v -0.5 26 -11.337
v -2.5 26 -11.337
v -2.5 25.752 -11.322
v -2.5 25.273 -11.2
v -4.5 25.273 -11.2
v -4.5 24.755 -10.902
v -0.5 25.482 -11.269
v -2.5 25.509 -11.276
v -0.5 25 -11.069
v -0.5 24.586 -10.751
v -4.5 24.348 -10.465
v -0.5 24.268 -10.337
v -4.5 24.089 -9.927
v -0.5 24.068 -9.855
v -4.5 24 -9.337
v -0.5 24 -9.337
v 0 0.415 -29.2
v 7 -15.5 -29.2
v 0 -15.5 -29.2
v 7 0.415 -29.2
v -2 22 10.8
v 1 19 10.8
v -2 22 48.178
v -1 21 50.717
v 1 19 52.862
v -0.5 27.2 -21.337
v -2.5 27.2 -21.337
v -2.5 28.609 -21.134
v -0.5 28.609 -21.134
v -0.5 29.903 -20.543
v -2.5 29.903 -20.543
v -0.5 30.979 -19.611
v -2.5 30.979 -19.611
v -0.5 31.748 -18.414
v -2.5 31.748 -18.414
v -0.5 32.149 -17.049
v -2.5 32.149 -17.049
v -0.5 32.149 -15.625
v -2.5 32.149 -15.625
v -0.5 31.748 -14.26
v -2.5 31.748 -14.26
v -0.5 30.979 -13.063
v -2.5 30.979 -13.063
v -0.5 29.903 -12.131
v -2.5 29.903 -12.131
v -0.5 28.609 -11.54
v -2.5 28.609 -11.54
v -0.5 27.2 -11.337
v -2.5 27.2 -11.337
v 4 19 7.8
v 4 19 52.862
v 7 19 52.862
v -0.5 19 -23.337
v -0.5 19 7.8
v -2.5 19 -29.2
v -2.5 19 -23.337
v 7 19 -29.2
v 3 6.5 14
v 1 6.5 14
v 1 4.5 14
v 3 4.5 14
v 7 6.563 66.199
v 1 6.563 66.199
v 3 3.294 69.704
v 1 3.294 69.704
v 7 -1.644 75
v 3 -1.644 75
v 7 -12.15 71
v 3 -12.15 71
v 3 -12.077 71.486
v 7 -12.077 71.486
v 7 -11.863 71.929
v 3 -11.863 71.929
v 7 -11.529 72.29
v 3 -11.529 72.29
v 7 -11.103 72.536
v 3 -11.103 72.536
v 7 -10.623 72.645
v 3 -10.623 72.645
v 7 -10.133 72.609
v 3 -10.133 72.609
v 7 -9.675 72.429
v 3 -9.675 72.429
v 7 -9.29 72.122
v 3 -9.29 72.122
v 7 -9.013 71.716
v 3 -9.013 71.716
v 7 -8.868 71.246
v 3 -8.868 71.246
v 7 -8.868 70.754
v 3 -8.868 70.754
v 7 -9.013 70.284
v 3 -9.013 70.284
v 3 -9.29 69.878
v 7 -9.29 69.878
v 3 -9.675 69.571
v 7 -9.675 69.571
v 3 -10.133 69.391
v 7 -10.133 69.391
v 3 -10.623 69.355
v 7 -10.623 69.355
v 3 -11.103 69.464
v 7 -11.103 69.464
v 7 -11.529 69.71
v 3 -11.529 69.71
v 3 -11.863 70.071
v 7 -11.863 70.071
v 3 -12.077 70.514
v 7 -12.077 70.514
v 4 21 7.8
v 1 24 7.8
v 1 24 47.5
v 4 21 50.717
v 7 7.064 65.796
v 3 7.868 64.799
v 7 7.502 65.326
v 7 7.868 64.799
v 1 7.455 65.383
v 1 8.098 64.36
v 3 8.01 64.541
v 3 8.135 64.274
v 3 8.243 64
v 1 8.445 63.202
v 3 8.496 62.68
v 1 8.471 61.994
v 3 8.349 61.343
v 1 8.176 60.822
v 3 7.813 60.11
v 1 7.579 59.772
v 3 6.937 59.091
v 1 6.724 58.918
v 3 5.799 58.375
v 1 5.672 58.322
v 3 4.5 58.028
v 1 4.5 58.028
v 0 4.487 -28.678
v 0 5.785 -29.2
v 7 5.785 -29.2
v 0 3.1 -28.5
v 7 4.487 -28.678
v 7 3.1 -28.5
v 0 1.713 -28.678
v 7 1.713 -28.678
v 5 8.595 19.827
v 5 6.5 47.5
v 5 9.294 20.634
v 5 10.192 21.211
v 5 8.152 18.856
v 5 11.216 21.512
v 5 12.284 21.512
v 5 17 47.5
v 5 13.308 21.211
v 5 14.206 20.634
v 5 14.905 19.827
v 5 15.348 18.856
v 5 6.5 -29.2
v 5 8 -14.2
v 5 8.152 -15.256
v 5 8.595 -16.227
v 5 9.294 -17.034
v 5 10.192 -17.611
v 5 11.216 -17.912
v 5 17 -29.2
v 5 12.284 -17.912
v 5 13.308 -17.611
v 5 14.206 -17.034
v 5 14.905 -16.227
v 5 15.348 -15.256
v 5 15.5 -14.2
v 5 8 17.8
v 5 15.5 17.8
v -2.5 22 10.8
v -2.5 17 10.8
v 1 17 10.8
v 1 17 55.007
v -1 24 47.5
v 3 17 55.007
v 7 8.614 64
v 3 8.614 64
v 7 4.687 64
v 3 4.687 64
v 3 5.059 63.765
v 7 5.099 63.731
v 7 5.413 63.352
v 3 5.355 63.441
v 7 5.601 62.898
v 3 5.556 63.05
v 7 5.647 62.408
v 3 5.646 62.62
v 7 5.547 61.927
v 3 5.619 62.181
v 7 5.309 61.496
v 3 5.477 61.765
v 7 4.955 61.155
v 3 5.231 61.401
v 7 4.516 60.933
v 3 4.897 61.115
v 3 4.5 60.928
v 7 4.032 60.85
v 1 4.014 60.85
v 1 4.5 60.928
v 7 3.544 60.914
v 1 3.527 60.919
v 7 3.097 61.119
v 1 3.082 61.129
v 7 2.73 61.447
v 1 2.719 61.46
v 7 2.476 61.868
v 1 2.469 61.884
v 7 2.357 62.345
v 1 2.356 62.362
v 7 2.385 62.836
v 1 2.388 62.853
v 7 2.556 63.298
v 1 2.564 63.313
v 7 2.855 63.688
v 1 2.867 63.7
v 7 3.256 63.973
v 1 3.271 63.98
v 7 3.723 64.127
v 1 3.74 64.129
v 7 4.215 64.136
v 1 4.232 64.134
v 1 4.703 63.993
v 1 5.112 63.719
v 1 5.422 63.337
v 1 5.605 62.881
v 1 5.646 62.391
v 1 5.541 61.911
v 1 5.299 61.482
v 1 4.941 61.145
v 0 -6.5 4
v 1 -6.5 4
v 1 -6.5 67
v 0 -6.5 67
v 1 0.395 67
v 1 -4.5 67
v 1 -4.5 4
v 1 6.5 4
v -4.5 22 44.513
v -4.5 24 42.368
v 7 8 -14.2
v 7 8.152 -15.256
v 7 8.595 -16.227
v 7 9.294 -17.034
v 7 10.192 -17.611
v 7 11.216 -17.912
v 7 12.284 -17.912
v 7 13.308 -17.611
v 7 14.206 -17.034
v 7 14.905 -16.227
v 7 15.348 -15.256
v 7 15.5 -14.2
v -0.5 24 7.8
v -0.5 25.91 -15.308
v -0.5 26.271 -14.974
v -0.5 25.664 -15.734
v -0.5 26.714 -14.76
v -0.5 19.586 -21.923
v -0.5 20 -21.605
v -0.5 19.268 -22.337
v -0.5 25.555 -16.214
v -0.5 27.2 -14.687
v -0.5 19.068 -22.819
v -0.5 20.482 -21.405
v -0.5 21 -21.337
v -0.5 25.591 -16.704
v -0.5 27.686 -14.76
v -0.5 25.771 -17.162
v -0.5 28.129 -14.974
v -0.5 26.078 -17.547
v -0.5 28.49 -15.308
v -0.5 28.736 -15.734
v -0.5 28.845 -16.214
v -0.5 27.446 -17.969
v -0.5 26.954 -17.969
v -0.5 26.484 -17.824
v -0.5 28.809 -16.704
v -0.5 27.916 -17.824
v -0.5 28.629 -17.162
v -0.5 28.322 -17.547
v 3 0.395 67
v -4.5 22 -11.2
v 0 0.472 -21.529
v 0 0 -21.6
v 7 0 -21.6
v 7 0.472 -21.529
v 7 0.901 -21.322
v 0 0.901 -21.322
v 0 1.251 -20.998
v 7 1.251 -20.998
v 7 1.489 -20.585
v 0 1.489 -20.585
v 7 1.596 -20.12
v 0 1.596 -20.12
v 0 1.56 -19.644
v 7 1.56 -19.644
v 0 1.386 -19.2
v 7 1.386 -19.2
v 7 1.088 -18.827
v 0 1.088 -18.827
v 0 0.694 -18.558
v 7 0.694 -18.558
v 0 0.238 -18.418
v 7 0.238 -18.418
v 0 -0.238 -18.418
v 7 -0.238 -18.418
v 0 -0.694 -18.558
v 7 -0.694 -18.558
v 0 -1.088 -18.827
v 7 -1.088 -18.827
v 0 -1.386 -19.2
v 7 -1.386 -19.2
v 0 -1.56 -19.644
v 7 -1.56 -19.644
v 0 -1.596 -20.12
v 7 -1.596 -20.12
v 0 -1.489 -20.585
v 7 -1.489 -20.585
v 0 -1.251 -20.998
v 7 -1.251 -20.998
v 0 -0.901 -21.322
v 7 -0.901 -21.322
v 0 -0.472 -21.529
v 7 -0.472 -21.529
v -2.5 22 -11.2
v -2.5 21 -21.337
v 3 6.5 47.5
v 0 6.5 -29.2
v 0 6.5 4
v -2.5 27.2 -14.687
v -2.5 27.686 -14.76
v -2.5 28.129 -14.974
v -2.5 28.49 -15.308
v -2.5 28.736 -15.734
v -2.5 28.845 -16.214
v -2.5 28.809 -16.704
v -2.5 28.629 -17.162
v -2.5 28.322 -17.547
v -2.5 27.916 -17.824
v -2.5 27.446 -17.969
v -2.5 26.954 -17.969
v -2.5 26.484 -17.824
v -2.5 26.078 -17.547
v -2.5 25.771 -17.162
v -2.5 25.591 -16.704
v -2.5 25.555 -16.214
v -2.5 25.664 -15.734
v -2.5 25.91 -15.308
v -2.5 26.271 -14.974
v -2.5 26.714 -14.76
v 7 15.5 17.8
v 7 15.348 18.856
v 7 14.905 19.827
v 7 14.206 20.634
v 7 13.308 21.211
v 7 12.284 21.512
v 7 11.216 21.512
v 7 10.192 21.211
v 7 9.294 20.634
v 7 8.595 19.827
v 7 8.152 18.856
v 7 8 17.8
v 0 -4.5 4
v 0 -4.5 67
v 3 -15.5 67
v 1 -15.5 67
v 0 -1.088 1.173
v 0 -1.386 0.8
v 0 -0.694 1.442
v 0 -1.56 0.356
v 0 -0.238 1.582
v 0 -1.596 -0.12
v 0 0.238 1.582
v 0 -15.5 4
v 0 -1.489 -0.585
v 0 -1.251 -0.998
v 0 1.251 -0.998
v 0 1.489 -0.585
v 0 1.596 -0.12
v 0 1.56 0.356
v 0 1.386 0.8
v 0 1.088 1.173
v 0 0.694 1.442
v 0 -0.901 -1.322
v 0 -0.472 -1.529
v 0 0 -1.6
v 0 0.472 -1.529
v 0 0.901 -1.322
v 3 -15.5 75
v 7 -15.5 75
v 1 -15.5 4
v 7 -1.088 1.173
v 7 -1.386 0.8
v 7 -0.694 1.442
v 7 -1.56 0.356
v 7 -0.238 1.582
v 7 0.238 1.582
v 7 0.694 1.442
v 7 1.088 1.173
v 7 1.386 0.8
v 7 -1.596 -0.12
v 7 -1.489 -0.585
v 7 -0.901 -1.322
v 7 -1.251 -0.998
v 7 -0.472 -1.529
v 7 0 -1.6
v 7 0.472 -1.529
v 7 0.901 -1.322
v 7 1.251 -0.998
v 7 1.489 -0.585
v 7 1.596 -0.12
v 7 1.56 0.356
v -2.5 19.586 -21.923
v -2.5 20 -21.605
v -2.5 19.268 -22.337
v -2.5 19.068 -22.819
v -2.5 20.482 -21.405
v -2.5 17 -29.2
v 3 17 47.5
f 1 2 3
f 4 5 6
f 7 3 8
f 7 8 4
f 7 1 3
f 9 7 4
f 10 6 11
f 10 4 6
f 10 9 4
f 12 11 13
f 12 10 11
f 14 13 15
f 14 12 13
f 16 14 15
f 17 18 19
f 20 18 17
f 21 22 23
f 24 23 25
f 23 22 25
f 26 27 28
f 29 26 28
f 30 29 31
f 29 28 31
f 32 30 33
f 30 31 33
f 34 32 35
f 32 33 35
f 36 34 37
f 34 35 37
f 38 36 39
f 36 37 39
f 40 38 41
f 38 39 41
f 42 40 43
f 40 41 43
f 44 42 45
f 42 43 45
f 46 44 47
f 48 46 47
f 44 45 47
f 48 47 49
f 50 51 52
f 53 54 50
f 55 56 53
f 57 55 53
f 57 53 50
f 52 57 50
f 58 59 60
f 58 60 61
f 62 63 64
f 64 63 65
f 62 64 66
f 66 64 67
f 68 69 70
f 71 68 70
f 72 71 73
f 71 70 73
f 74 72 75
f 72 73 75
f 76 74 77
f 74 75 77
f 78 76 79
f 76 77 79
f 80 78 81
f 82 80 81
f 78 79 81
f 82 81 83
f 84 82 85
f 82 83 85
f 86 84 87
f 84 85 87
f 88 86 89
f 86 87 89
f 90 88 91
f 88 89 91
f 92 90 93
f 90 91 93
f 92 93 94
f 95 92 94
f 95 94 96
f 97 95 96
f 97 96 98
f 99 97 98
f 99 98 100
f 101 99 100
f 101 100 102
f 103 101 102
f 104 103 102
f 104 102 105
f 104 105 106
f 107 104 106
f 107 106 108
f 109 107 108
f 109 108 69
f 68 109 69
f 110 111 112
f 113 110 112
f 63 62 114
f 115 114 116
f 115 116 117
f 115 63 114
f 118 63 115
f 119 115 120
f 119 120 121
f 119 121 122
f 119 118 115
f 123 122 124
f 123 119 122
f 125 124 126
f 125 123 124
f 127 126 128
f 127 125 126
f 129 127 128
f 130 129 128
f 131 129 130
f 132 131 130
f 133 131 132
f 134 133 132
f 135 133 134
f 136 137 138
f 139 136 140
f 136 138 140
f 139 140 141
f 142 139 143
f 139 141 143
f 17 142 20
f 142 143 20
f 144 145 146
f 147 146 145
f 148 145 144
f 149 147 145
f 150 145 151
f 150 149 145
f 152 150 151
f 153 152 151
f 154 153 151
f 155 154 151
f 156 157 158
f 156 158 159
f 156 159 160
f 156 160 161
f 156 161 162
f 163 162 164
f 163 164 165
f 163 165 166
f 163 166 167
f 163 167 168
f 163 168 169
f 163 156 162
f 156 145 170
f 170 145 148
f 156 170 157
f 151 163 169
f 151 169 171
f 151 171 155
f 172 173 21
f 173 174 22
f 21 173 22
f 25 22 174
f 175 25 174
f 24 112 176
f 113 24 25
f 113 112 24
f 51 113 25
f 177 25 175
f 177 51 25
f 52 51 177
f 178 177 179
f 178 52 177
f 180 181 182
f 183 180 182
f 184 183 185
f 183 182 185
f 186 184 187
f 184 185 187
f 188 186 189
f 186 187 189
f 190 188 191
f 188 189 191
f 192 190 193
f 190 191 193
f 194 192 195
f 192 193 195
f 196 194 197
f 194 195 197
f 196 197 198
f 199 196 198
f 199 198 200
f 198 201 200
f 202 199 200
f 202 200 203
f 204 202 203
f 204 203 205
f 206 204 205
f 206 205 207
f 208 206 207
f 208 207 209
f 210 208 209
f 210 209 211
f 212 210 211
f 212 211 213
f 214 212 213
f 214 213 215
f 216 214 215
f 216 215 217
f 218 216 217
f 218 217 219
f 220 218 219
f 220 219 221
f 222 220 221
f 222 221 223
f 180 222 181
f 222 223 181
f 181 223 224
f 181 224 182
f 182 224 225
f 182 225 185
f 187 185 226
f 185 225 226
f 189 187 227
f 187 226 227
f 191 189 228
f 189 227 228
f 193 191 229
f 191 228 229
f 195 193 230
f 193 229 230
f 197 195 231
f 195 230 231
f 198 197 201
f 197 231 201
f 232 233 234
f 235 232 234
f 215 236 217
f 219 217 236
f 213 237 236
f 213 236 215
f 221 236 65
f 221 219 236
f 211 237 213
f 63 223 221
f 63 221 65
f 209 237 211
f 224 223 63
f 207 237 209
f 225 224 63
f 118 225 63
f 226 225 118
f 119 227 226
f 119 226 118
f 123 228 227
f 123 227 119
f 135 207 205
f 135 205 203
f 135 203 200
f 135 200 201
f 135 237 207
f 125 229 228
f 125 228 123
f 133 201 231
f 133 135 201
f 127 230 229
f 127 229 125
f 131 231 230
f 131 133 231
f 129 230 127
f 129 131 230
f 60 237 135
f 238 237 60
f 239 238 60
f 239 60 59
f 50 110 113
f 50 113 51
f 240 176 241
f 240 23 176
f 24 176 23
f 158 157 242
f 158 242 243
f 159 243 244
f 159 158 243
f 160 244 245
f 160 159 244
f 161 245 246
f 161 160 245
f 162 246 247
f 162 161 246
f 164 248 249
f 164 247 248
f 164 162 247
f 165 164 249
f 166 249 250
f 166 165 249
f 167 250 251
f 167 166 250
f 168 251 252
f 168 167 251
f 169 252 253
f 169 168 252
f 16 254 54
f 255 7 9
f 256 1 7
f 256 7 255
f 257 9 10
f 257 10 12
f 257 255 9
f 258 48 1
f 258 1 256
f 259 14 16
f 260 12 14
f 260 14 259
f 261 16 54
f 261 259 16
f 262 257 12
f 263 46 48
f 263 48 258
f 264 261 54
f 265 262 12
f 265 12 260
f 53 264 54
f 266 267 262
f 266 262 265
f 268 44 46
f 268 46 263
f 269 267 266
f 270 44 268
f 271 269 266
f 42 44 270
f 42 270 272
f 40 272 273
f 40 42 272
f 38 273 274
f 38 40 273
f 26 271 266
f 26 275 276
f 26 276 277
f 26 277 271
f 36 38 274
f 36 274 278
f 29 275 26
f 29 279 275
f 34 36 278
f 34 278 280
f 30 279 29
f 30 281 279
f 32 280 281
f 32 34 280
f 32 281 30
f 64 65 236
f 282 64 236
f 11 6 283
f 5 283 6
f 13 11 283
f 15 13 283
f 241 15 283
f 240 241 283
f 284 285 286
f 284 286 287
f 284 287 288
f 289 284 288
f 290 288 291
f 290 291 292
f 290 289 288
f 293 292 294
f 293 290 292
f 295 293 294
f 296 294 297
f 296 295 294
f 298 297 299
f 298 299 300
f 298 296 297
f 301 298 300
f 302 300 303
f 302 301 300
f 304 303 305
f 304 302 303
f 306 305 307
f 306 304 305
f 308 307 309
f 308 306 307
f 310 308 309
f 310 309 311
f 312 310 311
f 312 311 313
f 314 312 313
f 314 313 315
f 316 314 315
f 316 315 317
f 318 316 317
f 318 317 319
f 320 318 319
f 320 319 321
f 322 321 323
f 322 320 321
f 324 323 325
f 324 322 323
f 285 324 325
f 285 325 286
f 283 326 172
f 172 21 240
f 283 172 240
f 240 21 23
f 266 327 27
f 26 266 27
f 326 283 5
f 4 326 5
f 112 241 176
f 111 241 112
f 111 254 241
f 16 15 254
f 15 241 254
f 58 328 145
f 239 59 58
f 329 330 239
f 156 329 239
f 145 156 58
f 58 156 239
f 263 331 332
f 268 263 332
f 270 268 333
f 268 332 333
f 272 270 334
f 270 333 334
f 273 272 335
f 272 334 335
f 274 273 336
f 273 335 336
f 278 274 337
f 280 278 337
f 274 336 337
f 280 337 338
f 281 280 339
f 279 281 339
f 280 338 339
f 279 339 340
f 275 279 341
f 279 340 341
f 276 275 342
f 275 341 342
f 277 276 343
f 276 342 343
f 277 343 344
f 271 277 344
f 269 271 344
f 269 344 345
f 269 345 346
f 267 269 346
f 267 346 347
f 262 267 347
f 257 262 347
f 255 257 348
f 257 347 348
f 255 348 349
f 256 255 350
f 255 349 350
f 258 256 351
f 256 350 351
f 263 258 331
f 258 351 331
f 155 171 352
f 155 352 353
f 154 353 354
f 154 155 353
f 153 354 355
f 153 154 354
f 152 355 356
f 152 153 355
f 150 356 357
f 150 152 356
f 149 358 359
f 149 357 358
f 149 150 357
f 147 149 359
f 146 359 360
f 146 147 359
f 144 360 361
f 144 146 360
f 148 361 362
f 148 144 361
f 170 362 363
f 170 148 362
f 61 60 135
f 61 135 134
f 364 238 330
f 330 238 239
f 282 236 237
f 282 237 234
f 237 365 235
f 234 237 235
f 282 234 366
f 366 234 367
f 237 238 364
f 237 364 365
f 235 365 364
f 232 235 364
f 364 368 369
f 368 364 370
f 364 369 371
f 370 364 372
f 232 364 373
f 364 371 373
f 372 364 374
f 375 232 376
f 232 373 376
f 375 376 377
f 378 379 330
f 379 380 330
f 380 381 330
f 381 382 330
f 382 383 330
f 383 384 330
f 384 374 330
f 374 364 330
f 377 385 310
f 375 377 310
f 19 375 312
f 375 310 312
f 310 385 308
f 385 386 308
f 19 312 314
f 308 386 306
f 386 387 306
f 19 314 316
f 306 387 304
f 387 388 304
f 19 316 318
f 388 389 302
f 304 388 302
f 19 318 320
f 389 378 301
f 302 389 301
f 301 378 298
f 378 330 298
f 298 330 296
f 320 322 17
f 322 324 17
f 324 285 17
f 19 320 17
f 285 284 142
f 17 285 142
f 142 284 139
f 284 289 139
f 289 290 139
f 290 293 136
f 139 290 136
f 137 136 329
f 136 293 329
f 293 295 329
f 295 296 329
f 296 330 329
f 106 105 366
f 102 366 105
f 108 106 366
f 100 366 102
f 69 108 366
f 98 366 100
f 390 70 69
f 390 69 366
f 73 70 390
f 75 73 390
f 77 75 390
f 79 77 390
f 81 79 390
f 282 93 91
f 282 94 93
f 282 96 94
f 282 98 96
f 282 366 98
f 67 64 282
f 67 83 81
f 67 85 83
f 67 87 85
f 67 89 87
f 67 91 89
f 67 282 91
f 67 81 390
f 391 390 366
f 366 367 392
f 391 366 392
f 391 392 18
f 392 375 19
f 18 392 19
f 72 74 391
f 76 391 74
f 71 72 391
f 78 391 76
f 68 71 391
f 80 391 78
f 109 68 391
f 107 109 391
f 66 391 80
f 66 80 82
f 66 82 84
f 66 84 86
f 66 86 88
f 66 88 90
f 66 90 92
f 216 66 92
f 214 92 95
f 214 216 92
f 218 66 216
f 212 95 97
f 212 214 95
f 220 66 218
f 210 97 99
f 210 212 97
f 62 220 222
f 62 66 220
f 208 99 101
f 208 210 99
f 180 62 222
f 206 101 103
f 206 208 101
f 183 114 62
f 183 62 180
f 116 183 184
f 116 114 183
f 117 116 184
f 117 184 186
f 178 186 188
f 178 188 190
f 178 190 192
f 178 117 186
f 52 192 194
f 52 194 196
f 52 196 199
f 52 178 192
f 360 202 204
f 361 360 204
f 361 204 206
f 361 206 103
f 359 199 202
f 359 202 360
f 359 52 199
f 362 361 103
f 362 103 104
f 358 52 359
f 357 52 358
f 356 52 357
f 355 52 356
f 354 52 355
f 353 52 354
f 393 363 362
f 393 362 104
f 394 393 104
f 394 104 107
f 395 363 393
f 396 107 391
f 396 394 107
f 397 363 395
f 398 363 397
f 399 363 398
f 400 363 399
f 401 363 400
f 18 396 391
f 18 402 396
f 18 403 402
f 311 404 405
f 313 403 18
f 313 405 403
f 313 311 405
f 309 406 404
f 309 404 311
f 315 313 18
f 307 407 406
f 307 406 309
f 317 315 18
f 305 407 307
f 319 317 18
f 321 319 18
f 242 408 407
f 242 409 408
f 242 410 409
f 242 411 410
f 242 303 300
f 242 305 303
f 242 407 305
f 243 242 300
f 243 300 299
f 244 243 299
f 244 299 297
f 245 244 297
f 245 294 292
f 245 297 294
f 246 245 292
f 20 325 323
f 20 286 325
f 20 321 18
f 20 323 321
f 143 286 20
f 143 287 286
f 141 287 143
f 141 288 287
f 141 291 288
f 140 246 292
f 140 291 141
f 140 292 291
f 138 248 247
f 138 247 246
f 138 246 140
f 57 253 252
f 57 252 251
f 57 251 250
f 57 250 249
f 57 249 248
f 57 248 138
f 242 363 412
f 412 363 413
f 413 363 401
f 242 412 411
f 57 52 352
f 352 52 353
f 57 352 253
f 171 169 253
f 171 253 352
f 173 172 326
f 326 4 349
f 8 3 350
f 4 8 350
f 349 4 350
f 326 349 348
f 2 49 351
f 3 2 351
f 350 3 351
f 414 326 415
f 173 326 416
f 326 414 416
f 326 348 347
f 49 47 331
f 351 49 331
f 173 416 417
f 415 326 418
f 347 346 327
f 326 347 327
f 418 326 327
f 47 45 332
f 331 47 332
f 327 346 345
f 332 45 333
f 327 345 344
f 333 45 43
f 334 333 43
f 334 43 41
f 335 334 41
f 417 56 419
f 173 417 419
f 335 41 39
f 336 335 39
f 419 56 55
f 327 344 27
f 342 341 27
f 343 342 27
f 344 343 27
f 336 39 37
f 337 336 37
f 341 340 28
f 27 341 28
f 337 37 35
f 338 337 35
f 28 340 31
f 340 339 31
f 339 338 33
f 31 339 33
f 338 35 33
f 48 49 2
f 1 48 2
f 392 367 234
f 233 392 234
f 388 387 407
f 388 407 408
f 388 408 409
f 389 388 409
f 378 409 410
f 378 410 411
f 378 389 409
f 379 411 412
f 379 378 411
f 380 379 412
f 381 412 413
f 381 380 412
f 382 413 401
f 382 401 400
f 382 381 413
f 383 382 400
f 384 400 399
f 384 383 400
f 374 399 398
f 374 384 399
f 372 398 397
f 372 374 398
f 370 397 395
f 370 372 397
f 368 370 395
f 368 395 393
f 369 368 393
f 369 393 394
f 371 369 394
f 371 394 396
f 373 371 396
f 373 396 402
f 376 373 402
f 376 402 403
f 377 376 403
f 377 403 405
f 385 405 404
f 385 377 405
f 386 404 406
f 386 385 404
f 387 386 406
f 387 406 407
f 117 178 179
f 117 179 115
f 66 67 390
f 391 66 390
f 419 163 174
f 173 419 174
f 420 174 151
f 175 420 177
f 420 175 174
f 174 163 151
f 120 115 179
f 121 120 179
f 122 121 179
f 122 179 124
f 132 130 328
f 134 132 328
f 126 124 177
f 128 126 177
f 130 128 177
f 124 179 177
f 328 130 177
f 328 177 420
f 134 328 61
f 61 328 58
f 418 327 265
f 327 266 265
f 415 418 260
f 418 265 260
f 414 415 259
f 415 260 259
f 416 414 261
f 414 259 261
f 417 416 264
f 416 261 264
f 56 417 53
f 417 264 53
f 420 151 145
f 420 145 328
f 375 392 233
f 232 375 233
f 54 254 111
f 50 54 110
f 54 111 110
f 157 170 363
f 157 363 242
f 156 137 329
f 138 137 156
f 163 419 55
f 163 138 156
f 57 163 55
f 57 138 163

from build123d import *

# Parameters (mm, degrees)
SKETCH_1_W           = 33.2
SKETCH_1_H           = 22
SKETCH_1_R           = 1.6
EXTRUDE_1_DEPTH      = 7
SKETCH_2_W           = 33.2
SKETCH_2_H           = 10.5
EXTRUDE_2_DEPTH      = 2
EXTRUDE_3_DEPTH      = 60
SKETCH_4_W           = 2
SKETCH_4_H           = 10.5
EXTRUDE_4_DEPTH      = 38.5
SKETCH_5_W           = 4
SKETCH_5_H           = 10.5
EXTRUDE_5_DEPTH      = 2
SKETCH_6_W           = 4
SKETCH_6_H           = 10.5
EXTRUDE_6_DEPTH      = 19.5
SKETCH_7_W           = 6
SKETCH_7_H           = 93.2
EXTRUDE_7_DEPTH      = 2
SKETCH_8_W           = 93.2
SKETCH_8_H           = 5
EXTRUDE_8_DEPTH      = 3
SKETCH_10_W          = 93.2
SKETCH_10_H          = 2
EXTRUDE_9_DEPTH      = 5.5
SKETCH_12_W          = 18
SKETCH_12_H          = 2
CUT_EXTRUDE_1_DEPTH  = 5.5
SKETCH_13_W          = 40
SKETCH_13_H          = 5
EXTRUDE_10_DEPTH     = 3.5
CUT_EXTRUDE_2_REACH  = 70.879
SKETCH_15_W          = 15.5
SKETCH_15_H          = 5
SKETCH_16_W          = 3.5
SKETCH_16_H          = 2.5
EXTRUDE_12_DEPTH     = 2
CUT_EXTRUDE_3_REACH  = 71.313
CHAMFER_1_SIZE       = 3.5
SKETCH_18_R          = 1.65
EXTRUDE_13_DEPTH     = 2
FILLET_1_R           = 2
SKETCH_19_W          = 4.5
SKETCH_19_H          = 21.5
CUT_EXTRUDE_4_DEPTH  = 5
CHAMFER_2_SIZE       = 3
CUT_EXTRUDE_5_REACH  = 74.561
SKETCH_20_R          = 1.65
EXTRUDE_14_REACH     = 73.895
SKETCH_21_R          = 4.5
SKETCH_21_R_2        = 1.65
EXTRUDE_15_DEPTH     = 6
EXTRUDE_16_DEPTH     = 4
CUT_EXTRUDE_6_REACH  = 83.84
SKETCH_24_R          = 1.65
CUT_EXTRUDE_7_REACH  = 84.171
SKETCH_26_W          = 2
SKETCH_26_H          = 10.5
CUT_EXTRUDE_8_DEPTH  = 5
SKETCH_27_W          = 2
SKETCH_27_H          = 2
EXTRUDE_17_DEPTH     = 10
CUT_EXTRUDE_9_DEPTH  = 2
CUT_EXTRUDE_10_REACH = 84.426
SKETCH_29_R          = 5.5
SKETCH_30_W          = 63
SKETCH_30_H          = 2
EXTRUDE_18_DEPTH     = 1


with BuildPart() as part:
    # 草图1 → 凸台-拉伸1 (new body)
    with BuildSketch(Plane(origin=(0, 0, 0), x_dir=(0, 0, -1), z_dir=(1, 0, 0))):
        with Locations((12.6, -4.5)):
            Rectangle(SKETCH_1_W, SKETCH_1_H)
        Circle(SKETCH_1_R, mode=Mode.SUBTRACT)
        with Locations((20, 0)):
            Circle(SKETCH_1_R, mode=Mode.SUBTRACT)
    extrude(amount=EXTRUDE_1_DEPTH)

    # 草图2 → 凸台-拉伸2 (add)
    with BuildSketch(Plane(origin=(7, 0, 0), x_dir=(0, 0, -1), z_dir=(1, 0, 0))):
        with Locations((12.6, 11.75)):
            Rectangle(SKETCH_2_W, SKETCH_2_H)
    extrude(amount=-EXTRUDE_2_DEPTH)

    # 草图3 → 凸台-拉伸3 (add)
    with BuildSketch(Plane.XY.offset(4)):
        Polygon((7, -15.5), (1, -15.5), (1, 4.5), (3, 4.5), (3, 6.5), (7, 6.5), align=None)
    extrude(amount=EXTRUDE_3_DEPTH)

    # 草图4 → 凸台-拉伸4 (add)
    with BuildSketch(Plane.XY.offset(4)):
        with Locations((6, 11.75)):
            Rectangle(SKETCH_4_W, SKETCH_4_H)
    extrude(amount=EXTRUDE_4_DEPTH)

    # 草图5 → 凸台-拉伸5 (add)
    with BuildSketch(Plane.XY.offset(42.5)):
        with Locations((5, 11.75)):
            Rectangle(SKETCH_5_W, SKETCH_5_H)
    extrude(amount=EXTRUDE_5_DEPTH)

    # 草图6 → 凸台-拉伸6 (add)
    with BuildSketch(Plane.XY.offset(44.5)):
        with Locations((5, 11.75)):
            Rectangle(SKETCH_6_W, SKETCH_6_H)
    extrude(amount=EXTRUDE_6_DEPTH)

    # 草图7 → 凸台-拉伸7 (add)
    with BuildSketch(Plane(origin=(0, 17, 0), x_dir=(1, 0, 0), z_dir=(0, 1, 0))):
        with Locations((4, -17.4)):
            Rectangle(SKETCH_7_W, SKETCH_7_H)
    extrude(amount=EXTRUDE_7_DEPTH)

    # 草图8 → 凸台-拉伸8 (add)
    with BuildSketch(Plane.ZY.offset(-1)):
        with Locations((17.4, 21.5)):
            Rectangle(SKETCH_8_W, SKETCH_8_H)
    extrude(amount=-EXTRUDE_8_DEPTH)

    # 草图10 → 凸台-拉伸9 (add)
    with BuildSketch(Plane.ZY.offset(-1)):
        with Locations((17.4, 23)):
            Rectangle(SKETCH_10_W, SKETCH_10_H)
    extrude(amount=EXTRUDE_9_DEPTH)

    # 草图12 → 切除-拉伸1 (cut)
    with BuildSketch(Plane.ZY.offset(4.5)):
        with Locations((-20.2, 23)):
            Rectangle(SKETCH_12_W, SKETCH_12_H)
    extrude(amount=-CUT_EXTRUDE_1_DEPTH, mode=Mode.SUBTRACT)

    # 草图13 → 凸台-拉伸10 (add)
    with BuildSketch(Plane.ZY.offset(-1)):
        with Locations((-9.2, 19.5)):
            Rectangle(SKETCH_13_W, SKETCH_13_H)
    extrude(amount=EXTRUDE_10_DEPTH)

    # 草图15 → 切除-拉伸2 (cut, up to next)
    with BuildSketch(Plane(origin=(4, 0, 0), x_dir=(0, 0, -1), z_dir=(1, 0, 0)), mode=Mode.PRIVATE) as cut_extrude_2_sk1:
        with Locations((21.45, 21.5)):
            Rectangle(SKETCH_15_W, SKETCH_15_H)
    cut_extrude_2_tool1 = extrude(cut_extrude_2_sk1.sketch, amount=-CUT_EXTRUDE_2_REACH, mode=Mode.PRIVATE) & part.part
    add(cut_extrude_2_tool1.solids().sort_by_distance((4, 21.5, -21.45))[0], mode=Mode.SUBTRACT)

    # 草图16 → 凸台-拉伸12 (add)
    with BuildSketch(Plane(origin=(0, 22, 0), x_dir=(1, 0, 0), z_dir=(0, 1, 0))):
        with Locations((-0.75, 12.45)):
            Rectangle(SKETCH_16_W, SKETCH_16_H)
    extrude(amount=EXTRUDE_12_DEPTH)

    # 草图17 → 切除-拉伸3 (cut, up to next)
    with BuildSketch(Plane(origin=(7, 0, 0), x_dir=(0, 0, -1), z_dir=(1, 0, 0)), mode=Mode.PRIVATE) as cut_extrude_3_sk1:
        Polygon((-47.5, 24), (-64, 8.613501079), (-64, 24), align=None)
    cut_extrude_3_tool1 = extrude(cut_extrude_3_sk1.sketch, amount=-CUT_EXTRUDE_3_REACH, mode=Mode.PRIVATE) & part.part
    add(cut_extrude_3_tool1.solids().sort_by_distance((7, 18.871167, 58.5))[0], mode=Mode.SUBTRACT)

    # 倒角1
    # the kernel refuses this chamfer: 3.5 mm, written as the material it takes off along each edge
    with BuildSketch(Plane(origin=(-4.5, 15.861407469, 56.227571974), x_dir=(0.9996219169112969, 0.020109211138415985, 0.018752142756900524), z_dir=(0, 0.6819983600625026, -0.7313537016191667))) as chamfer_1_piece_1:
        Polygon((CHAMFER_1_SIZE * 0.999621916911, CHAMFER_1_SIZE * 0.0274958766106), (-CHAMFER_1_SIZE * 0.0274958766106, CHAMFER_1_SIZE * 0.999621916911), (0, 0), align=None)
    extrude(amount=20.934339287, mode=Mode.SUBTRACT)

    # 草图18 → 凸台-拉伸13 (add)
    with BuildSketch(Plane.ZY.offset(2.5)):
        with BuildLine():
            Line((-11.337, 27.2), (-11.337, 24))
            Line((-11.337, 24), (-13.7, 24))
            Line((-13.7, 24), (-13.7, 19))
            Line((-13.7, 19), (-21.337, 19))
            Line((-21.337, 19), (-21.337, 27.2))
            ThreePointArc((-21.337, 27.2), (-16.337, 32.2), (-11.337, 27.2))
        make_face()
        with Locations((-16.337, 27.2)):
            Circle(SKETCH_18_R, mode=Mode.SUBTRACT)
    extrude(amount=-EXTRUDE_13_DEPTH)

    # 圆角1
    fillet_1_edges = [part.edges().sort_by_distance(p)[0] for p in [
        (-1.5, 24, -11.337),
        (-1.5, 19, -21.337),
    ]]
    fillet(fillet_1_edges, radius=FILLET_1_R)

    # 草图19 → 切除-拉伸4 (cut)
    with BuildSketch(Plane(origin=(0, 24, 0), x_dir=(1, 0, 0), z_dir=(0, 1, 0))):
        with Locations((1.75, 2.95)):
            Rectangle(SKETCH_19_W, SKETCH_19_H)
    extrude(amount=-CUT_EXTRUDE_4_DEPTH, mode=Mode.SUBTRACT)

    # 倒角2
    chamfer_2_edges = [part.edges().sort_by_distance(p)[0] for p in [
        (4, 24, 27.65),
        (1, 22, 30.22236871),
    ]]
    chamfer(chamfer_2_edges, length=CHAMFER_2_SIZE)

    # 草图20 → 切除-拉伸5 (cut, up to next)
    with BuildSketch(Plane(origin=(7, 0, 0), x_dir=(0, 0, -1), z_dir=(1, 0, 0)), mode=Mode.PRIVATE) as cut_extrude_5_sk1:
        with Locations((-62.5, 4)):
            Circle(SKETCH_20_R)
    cut_extrude_5_tool1 = extrude(cut_extrude_5_sk1.sketch, amount=-CUT_EXTRUDE_5_REACH, mode=Mode.PRIVATE) & part.part
    add(cut_extrude_5_tool1.solids().sort_by_distance((7, 4, 62.5))[0], mode=Mode.SUBTRACT)

    # 凸台-拉伸14: up to this face of the body (flat: up to its plane)
    extrude_14_end = Plane(part.part.faces().sort_by_distance((7, 1.498387626, 16.627822956))[0])
    # 草图21 → 凸台-拉伸14 (add, up to the picked face)
    with BuildSketch(Plane.ZY.offset(-1), mode=Mode.PRIVATE) as extrude_14_sk1:
        with Locations((62.5, 4)):
            Circle(SKETCH_21_R)
        with Locations(Location((62.5, 4, 0), (0, 0, 180))):
            Circle(SKETCH_21_R_2, mode=Mode.SUBTRACT)
    extrude_14_tool1 = split(extrude(extrude_14_sk1.sketch, amount=-EXTRUDE_14_REACH, mode=Mode.PRIVATE), bisect_by=extrude_14_end, keep=Keep.BOTH, mode=Mode.PRIVATE)
    add(extrude_14_tool1.solids().sort_by(Axis((1, 4, 58.127279), (1, 0, 0)))[0])

    # 草图22 → 凸台-拉伸15 (add)
    with BuildSketch(Plane.ZY.offset(-1)):
        with BuildLine():
            Line((66.198595209, 6.563277878), (75, -1.644164869))
            Line((75, -1.644164869), (75, -15.5))
            Line((75, -15.5), (64, -15.5))
            Line((64, -15.5), (64, -0.242640687))
            ThreePointArc((64, -0.242640687), (66.782111619, 2.616699568), (66.198595209, 6.563277878))
        make_face()
    extrude(amount=-EXTRUDE_15_DEPTH)

    # 草图23 → 凸台-拉伸16 (add)
    with BuildSketch(Plane(origin=(7, 0, 0), x_dir=(0, 0, -1), z_dir=(1, 0, 0))):
        Polygon((-64, 8.613501079), (-64.799032902, 7.868390843), (-64, 8.242640687), align=None)
    extrude(amount=-EXTRUDE_16_DEPTH)

    # 草图24 → 切除-拉伸6 (cut, up to next)
    with BuildSketch(Plane.ZY.offset(-1), mode=Mode.PRIVATE) as cut_extrude_6_sk1:
        with Locations(Location((71, -10.5, 0), (0, 0, 270))):
            Circle(SKETCH_24_R)
    cut_extrude_6_tool1 = extrude(cut_extrude_6_sk1.sketch, amount=-CUT_EXTRUDE_6_REACH, mode=Mode.PRIVATE) & part.part
    add(cut_extrude_6_tool1.solids().sort_by_distance((1, -10.5, 71))[0], mode=Mode.SUBTRACT)

    # 草图25 → 切除-拉伸7 (cut, up to next)
    with BuildSketch(Plane.ZY.offset(-5), mode=Mode.PRIVATE) as cut_extrude_7_sk1:
        with BuildLine():
            Line((17.8, 8), (-14.2, 8))
            ThreePointArc((-14.2, 8), (-17.95, 11.75), (-14.2, 15.5))
            Line((-14.2, 15.5), (17.8, 15.5))
            ThreePointArc((17.8, 15.5), (21.55, 11.75), (17.8, 8))
        make_face()
    cut_extrude_7_tool1 = extrude(cut_extrude_7_sk1.sketch, amount=-CUT_EXTRUDE_7_REACH, mode=Mode.PRIVATE) & part.part
    add(cut_extrude_7_tool1.solids().sort_by_distance((5, 11.75, 1.8))[0], mode=Mode.SUBTRACT)

    # 草图26 → 切除-拉伸8 (cut)
    with BuildSketch(Plane(origin=(0, 0, 42.5), x_dir=(-1, 0, 0), z_dir=(0, 0, -1))):
        with Locations((-4, 11.75)):
            Rectangle(SKETCH_26_W, SKETCH_26_H)
    extrude(amount=-CUT_EXTRUDE_8_DEPTH, mode=Mode.SUBTRACT)

    # 草图27 → 凸台-拉伸17 (add)
    with BuildSketch(Plane.XY.offset(4)):
        with Locations((2, 5.5)):
            Rectangle(SKETCH_27_W, SKETCH_27_H)
    extrude(amount=EXTRUDE_17_DEPTH)

    # 草图28 → 切除-拉伸9 (cut)
    with BuildSketch(Plane.ZY.offset(-1)):
        Polygon((67, 0.394553878), (67, -15.5), (75, -15.5), (75, -1.644164869), (69.70409784, 3.29434379), align=None)
    extrude(amount=-CUT_EXTRUDE_9_DEPTH, mode=Mode.SUBTRACT)

    # 草图29 → 切除-拉伸10 (cut, up to next)
    with BuildSketch(Plane(origin=(7, 0, 0), x_dir=(0, 0, -1), z_dir=(1, 0, 0)), mode=Mode.PRIVATE) as cut_extrude_10_sk1:
        with Locations((34, 3.1)):
            Circle(SKETCH_29_R)
    cut_extrude_10_tool1 = extrude(cut_extrude_10_sk1.sketch, amount=-CUT_EXTRUDE_10_REACH, mode=Mode.PRIVATE) & part.part
    add(cut_extrude_10_tool1.solids().sort_by_distance((7, 3.1, -34))[0], mode=Mode.SUBTRACT)

    # 草图30 → 凸台-拉伸18 (add)
    with BuildSketch(Plane.ZY.offset(-1)):
        with Locations((35.5, -5.5)):
            Rectangle(SKETCH_30_W, SKETCH_30_H)
    extrude(amount=EXTRUDE_18_DEPTH)


solid = part.part
